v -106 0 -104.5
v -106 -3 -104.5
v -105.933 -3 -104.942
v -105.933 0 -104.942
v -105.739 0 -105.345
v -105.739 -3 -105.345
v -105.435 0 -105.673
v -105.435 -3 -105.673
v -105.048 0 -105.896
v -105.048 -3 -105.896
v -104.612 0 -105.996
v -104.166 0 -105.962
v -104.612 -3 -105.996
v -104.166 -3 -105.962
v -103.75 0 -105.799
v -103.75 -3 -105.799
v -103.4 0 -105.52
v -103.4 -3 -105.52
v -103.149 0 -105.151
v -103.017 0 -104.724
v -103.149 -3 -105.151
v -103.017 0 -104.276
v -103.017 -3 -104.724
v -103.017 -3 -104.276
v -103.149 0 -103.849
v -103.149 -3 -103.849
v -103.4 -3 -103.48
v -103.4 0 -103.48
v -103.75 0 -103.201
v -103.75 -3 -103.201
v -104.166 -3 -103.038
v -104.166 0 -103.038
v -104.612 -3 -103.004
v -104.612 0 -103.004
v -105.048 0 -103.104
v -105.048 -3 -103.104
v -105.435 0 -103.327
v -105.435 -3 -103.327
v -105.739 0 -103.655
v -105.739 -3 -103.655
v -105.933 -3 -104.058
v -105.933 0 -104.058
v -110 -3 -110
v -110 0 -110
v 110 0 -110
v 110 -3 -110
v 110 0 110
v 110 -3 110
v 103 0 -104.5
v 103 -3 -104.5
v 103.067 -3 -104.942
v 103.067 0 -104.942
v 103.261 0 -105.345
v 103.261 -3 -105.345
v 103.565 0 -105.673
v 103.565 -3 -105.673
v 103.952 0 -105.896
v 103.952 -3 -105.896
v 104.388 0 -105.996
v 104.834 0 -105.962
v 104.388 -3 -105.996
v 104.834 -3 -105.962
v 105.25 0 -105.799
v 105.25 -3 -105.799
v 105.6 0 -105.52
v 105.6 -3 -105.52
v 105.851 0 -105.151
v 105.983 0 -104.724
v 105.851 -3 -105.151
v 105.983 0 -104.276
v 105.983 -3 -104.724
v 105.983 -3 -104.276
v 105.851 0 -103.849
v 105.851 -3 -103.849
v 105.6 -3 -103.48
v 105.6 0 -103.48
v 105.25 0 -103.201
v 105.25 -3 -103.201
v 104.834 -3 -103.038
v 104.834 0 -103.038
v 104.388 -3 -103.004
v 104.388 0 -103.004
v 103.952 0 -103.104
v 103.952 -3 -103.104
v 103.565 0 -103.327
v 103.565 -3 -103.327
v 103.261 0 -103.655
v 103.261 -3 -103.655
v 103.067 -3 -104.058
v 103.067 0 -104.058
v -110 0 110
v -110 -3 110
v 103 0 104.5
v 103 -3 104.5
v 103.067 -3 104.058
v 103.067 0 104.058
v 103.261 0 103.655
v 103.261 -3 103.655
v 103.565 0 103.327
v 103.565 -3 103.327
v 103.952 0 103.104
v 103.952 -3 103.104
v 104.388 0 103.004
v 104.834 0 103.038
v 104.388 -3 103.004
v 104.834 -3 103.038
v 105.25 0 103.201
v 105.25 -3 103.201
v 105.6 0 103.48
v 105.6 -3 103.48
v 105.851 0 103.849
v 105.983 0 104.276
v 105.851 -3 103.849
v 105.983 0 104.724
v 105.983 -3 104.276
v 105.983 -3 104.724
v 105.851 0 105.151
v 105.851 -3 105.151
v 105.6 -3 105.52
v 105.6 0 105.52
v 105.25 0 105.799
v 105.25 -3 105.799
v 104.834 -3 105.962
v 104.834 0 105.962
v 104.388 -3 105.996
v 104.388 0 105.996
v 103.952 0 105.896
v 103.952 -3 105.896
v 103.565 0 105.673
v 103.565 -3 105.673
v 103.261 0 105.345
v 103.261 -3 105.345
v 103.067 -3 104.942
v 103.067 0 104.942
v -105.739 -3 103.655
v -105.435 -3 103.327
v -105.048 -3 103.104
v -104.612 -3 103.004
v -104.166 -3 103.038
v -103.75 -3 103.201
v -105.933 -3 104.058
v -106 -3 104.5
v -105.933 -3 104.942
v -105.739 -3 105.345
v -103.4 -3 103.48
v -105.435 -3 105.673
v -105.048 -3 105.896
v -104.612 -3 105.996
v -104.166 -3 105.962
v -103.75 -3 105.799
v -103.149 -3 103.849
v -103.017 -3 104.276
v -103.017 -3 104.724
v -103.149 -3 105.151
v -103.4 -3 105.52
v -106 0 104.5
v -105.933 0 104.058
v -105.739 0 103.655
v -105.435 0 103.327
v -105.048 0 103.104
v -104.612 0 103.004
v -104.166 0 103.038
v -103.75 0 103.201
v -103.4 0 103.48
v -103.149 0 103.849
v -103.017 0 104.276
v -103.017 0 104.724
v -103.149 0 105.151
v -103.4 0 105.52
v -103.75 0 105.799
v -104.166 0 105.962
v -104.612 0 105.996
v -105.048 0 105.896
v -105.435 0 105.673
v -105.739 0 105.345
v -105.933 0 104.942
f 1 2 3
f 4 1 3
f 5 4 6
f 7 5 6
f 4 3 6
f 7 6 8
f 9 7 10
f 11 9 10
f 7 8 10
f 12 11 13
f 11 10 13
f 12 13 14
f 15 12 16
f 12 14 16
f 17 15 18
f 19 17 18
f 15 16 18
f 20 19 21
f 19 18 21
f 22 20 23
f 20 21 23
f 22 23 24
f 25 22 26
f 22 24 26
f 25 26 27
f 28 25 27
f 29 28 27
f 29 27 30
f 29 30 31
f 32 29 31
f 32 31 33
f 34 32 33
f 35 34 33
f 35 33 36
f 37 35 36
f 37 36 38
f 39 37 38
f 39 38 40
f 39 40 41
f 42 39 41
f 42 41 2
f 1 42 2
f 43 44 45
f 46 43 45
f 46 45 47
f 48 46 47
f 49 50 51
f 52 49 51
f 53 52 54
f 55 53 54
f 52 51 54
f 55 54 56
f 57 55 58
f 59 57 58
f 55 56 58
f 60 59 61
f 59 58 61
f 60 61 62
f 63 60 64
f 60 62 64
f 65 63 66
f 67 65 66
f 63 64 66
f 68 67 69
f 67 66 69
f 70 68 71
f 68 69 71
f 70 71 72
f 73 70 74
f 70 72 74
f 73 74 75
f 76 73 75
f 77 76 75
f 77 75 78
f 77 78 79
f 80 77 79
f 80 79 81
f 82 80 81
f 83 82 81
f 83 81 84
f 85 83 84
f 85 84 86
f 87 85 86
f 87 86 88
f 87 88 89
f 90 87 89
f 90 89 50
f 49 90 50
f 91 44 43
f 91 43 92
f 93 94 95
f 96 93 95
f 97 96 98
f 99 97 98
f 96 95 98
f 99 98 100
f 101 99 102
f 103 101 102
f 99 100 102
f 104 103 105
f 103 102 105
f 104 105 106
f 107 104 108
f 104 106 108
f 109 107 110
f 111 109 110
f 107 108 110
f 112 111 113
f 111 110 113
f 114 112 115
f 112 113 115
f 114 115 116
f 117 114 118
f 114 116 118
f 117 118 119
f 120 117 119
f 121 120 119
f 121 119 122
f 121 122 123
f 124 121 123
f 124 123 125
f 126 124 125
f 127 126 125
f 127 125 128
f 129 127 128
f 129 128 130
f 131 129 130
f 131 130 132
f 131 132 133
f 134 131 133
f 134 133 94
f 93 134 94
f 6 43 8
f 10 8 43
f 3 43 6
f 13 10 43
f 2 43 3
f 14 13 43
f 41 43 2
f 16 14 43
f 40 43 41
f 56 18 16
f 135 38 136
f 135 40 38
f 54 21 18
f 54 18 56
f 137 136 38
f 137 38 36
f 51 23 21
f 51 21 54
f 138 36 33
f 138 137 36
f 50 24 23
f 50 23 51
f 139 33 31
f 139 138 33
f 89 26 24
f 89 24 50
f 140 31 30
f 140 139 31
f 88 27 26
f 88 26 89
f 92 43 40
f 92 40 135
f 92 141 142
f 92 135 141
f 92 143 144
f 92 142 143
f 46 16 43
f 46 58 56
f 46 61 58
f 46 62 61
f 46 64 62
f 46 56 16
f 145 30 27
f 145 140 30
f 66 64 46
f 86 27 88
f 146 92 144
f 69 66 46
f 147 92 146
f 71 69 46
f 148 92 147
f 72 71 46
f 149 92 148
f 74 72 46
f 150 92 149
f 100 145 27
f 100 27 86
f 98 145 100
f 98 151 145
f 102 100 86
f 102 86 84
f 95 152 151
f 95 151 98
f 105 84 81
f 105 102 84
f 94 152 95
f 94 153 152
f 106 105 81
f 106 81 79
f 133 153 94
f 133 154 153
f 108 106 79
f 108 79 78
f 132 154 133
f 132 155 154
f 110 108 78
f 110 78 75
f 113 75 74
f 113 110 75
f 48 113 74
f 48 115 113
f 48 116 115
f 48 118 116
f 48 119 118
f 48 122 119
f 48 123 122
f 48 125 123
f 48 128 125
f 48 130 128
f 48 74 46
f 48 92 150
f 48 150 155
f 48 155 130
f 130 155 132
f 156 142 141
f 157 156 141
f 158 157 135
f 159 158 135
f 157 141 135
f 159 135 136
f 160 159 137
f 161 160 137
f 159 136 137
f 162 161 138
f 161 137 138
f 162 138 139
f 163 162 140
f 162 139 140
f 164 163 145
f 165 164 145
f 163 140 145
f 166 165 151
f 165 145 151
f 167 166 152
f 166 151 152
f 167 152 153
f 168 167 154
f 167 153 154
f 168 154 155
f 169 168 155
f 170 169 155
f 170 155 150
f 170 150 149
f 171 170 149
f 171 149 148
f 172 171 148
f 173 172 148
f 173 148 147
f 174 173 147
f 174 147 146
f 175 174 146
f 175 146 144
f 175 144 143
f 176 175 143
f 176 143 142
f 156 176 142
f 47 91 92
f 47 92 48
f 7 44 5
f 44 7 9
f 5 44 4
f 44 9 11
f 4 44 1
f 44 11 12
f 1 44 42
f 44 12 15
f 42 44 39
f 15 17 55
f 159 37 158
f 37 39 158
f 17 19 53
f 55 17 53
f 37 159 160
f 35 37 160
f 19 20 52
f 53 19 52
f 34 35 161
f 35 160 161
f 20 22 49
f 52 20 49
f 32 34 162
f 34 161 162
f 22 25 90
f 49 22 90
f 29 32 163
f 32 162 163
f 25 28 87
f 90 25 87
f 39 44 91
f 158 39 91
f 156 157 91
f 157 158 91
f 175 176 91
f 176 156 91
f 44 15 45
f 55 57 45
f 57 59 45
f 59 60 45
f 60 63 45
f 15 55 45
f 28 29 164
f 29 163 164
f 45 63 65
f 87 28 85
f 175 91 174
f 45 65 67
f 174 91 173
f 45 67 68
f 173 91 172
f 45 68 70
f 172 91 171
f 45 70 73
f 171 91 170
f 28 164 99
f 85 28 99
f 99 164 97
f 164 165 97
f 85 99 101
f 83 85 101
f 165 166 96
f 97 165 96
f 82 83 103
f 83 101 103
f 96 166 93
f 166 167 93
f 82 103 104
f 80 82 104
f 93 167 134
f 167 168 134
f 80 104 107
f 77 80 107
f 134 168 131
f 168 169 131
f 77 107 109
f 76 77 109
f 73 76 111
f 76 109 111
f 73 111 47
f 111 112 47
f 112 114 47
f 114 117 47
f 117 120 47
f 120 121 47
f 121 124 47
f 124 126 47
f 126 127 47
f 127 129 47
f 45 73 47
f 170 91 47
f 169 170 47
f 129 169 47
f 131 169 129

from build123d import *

# Parameters (mm, degrees)
F0_W     = 220
F0_H     = 220
F1_DEPTH = 3
F2_D     = 3
F2_DEPTH = 10


with BuildPart() as f1:
    # F0 (on Front) → F1 (new body)
    with BuildSketch(Plane.XZ):
        Rectangle(F0_W, F0_H)
    extrude(amount=F1_DEPTH)

    # F2
    with Locations(Plane(origin=(0, 0, 0), x_dir=(1, 0, 0), z_dir=(0, 1, 0))):
        with Locations((-104.5, 104.5), (104.5, 104.5), (104.5, -104.5), (-104.5, -104.5)):
            Hole(F2_D / 2, depth=F2_DEPTH)


solid = f1.part
